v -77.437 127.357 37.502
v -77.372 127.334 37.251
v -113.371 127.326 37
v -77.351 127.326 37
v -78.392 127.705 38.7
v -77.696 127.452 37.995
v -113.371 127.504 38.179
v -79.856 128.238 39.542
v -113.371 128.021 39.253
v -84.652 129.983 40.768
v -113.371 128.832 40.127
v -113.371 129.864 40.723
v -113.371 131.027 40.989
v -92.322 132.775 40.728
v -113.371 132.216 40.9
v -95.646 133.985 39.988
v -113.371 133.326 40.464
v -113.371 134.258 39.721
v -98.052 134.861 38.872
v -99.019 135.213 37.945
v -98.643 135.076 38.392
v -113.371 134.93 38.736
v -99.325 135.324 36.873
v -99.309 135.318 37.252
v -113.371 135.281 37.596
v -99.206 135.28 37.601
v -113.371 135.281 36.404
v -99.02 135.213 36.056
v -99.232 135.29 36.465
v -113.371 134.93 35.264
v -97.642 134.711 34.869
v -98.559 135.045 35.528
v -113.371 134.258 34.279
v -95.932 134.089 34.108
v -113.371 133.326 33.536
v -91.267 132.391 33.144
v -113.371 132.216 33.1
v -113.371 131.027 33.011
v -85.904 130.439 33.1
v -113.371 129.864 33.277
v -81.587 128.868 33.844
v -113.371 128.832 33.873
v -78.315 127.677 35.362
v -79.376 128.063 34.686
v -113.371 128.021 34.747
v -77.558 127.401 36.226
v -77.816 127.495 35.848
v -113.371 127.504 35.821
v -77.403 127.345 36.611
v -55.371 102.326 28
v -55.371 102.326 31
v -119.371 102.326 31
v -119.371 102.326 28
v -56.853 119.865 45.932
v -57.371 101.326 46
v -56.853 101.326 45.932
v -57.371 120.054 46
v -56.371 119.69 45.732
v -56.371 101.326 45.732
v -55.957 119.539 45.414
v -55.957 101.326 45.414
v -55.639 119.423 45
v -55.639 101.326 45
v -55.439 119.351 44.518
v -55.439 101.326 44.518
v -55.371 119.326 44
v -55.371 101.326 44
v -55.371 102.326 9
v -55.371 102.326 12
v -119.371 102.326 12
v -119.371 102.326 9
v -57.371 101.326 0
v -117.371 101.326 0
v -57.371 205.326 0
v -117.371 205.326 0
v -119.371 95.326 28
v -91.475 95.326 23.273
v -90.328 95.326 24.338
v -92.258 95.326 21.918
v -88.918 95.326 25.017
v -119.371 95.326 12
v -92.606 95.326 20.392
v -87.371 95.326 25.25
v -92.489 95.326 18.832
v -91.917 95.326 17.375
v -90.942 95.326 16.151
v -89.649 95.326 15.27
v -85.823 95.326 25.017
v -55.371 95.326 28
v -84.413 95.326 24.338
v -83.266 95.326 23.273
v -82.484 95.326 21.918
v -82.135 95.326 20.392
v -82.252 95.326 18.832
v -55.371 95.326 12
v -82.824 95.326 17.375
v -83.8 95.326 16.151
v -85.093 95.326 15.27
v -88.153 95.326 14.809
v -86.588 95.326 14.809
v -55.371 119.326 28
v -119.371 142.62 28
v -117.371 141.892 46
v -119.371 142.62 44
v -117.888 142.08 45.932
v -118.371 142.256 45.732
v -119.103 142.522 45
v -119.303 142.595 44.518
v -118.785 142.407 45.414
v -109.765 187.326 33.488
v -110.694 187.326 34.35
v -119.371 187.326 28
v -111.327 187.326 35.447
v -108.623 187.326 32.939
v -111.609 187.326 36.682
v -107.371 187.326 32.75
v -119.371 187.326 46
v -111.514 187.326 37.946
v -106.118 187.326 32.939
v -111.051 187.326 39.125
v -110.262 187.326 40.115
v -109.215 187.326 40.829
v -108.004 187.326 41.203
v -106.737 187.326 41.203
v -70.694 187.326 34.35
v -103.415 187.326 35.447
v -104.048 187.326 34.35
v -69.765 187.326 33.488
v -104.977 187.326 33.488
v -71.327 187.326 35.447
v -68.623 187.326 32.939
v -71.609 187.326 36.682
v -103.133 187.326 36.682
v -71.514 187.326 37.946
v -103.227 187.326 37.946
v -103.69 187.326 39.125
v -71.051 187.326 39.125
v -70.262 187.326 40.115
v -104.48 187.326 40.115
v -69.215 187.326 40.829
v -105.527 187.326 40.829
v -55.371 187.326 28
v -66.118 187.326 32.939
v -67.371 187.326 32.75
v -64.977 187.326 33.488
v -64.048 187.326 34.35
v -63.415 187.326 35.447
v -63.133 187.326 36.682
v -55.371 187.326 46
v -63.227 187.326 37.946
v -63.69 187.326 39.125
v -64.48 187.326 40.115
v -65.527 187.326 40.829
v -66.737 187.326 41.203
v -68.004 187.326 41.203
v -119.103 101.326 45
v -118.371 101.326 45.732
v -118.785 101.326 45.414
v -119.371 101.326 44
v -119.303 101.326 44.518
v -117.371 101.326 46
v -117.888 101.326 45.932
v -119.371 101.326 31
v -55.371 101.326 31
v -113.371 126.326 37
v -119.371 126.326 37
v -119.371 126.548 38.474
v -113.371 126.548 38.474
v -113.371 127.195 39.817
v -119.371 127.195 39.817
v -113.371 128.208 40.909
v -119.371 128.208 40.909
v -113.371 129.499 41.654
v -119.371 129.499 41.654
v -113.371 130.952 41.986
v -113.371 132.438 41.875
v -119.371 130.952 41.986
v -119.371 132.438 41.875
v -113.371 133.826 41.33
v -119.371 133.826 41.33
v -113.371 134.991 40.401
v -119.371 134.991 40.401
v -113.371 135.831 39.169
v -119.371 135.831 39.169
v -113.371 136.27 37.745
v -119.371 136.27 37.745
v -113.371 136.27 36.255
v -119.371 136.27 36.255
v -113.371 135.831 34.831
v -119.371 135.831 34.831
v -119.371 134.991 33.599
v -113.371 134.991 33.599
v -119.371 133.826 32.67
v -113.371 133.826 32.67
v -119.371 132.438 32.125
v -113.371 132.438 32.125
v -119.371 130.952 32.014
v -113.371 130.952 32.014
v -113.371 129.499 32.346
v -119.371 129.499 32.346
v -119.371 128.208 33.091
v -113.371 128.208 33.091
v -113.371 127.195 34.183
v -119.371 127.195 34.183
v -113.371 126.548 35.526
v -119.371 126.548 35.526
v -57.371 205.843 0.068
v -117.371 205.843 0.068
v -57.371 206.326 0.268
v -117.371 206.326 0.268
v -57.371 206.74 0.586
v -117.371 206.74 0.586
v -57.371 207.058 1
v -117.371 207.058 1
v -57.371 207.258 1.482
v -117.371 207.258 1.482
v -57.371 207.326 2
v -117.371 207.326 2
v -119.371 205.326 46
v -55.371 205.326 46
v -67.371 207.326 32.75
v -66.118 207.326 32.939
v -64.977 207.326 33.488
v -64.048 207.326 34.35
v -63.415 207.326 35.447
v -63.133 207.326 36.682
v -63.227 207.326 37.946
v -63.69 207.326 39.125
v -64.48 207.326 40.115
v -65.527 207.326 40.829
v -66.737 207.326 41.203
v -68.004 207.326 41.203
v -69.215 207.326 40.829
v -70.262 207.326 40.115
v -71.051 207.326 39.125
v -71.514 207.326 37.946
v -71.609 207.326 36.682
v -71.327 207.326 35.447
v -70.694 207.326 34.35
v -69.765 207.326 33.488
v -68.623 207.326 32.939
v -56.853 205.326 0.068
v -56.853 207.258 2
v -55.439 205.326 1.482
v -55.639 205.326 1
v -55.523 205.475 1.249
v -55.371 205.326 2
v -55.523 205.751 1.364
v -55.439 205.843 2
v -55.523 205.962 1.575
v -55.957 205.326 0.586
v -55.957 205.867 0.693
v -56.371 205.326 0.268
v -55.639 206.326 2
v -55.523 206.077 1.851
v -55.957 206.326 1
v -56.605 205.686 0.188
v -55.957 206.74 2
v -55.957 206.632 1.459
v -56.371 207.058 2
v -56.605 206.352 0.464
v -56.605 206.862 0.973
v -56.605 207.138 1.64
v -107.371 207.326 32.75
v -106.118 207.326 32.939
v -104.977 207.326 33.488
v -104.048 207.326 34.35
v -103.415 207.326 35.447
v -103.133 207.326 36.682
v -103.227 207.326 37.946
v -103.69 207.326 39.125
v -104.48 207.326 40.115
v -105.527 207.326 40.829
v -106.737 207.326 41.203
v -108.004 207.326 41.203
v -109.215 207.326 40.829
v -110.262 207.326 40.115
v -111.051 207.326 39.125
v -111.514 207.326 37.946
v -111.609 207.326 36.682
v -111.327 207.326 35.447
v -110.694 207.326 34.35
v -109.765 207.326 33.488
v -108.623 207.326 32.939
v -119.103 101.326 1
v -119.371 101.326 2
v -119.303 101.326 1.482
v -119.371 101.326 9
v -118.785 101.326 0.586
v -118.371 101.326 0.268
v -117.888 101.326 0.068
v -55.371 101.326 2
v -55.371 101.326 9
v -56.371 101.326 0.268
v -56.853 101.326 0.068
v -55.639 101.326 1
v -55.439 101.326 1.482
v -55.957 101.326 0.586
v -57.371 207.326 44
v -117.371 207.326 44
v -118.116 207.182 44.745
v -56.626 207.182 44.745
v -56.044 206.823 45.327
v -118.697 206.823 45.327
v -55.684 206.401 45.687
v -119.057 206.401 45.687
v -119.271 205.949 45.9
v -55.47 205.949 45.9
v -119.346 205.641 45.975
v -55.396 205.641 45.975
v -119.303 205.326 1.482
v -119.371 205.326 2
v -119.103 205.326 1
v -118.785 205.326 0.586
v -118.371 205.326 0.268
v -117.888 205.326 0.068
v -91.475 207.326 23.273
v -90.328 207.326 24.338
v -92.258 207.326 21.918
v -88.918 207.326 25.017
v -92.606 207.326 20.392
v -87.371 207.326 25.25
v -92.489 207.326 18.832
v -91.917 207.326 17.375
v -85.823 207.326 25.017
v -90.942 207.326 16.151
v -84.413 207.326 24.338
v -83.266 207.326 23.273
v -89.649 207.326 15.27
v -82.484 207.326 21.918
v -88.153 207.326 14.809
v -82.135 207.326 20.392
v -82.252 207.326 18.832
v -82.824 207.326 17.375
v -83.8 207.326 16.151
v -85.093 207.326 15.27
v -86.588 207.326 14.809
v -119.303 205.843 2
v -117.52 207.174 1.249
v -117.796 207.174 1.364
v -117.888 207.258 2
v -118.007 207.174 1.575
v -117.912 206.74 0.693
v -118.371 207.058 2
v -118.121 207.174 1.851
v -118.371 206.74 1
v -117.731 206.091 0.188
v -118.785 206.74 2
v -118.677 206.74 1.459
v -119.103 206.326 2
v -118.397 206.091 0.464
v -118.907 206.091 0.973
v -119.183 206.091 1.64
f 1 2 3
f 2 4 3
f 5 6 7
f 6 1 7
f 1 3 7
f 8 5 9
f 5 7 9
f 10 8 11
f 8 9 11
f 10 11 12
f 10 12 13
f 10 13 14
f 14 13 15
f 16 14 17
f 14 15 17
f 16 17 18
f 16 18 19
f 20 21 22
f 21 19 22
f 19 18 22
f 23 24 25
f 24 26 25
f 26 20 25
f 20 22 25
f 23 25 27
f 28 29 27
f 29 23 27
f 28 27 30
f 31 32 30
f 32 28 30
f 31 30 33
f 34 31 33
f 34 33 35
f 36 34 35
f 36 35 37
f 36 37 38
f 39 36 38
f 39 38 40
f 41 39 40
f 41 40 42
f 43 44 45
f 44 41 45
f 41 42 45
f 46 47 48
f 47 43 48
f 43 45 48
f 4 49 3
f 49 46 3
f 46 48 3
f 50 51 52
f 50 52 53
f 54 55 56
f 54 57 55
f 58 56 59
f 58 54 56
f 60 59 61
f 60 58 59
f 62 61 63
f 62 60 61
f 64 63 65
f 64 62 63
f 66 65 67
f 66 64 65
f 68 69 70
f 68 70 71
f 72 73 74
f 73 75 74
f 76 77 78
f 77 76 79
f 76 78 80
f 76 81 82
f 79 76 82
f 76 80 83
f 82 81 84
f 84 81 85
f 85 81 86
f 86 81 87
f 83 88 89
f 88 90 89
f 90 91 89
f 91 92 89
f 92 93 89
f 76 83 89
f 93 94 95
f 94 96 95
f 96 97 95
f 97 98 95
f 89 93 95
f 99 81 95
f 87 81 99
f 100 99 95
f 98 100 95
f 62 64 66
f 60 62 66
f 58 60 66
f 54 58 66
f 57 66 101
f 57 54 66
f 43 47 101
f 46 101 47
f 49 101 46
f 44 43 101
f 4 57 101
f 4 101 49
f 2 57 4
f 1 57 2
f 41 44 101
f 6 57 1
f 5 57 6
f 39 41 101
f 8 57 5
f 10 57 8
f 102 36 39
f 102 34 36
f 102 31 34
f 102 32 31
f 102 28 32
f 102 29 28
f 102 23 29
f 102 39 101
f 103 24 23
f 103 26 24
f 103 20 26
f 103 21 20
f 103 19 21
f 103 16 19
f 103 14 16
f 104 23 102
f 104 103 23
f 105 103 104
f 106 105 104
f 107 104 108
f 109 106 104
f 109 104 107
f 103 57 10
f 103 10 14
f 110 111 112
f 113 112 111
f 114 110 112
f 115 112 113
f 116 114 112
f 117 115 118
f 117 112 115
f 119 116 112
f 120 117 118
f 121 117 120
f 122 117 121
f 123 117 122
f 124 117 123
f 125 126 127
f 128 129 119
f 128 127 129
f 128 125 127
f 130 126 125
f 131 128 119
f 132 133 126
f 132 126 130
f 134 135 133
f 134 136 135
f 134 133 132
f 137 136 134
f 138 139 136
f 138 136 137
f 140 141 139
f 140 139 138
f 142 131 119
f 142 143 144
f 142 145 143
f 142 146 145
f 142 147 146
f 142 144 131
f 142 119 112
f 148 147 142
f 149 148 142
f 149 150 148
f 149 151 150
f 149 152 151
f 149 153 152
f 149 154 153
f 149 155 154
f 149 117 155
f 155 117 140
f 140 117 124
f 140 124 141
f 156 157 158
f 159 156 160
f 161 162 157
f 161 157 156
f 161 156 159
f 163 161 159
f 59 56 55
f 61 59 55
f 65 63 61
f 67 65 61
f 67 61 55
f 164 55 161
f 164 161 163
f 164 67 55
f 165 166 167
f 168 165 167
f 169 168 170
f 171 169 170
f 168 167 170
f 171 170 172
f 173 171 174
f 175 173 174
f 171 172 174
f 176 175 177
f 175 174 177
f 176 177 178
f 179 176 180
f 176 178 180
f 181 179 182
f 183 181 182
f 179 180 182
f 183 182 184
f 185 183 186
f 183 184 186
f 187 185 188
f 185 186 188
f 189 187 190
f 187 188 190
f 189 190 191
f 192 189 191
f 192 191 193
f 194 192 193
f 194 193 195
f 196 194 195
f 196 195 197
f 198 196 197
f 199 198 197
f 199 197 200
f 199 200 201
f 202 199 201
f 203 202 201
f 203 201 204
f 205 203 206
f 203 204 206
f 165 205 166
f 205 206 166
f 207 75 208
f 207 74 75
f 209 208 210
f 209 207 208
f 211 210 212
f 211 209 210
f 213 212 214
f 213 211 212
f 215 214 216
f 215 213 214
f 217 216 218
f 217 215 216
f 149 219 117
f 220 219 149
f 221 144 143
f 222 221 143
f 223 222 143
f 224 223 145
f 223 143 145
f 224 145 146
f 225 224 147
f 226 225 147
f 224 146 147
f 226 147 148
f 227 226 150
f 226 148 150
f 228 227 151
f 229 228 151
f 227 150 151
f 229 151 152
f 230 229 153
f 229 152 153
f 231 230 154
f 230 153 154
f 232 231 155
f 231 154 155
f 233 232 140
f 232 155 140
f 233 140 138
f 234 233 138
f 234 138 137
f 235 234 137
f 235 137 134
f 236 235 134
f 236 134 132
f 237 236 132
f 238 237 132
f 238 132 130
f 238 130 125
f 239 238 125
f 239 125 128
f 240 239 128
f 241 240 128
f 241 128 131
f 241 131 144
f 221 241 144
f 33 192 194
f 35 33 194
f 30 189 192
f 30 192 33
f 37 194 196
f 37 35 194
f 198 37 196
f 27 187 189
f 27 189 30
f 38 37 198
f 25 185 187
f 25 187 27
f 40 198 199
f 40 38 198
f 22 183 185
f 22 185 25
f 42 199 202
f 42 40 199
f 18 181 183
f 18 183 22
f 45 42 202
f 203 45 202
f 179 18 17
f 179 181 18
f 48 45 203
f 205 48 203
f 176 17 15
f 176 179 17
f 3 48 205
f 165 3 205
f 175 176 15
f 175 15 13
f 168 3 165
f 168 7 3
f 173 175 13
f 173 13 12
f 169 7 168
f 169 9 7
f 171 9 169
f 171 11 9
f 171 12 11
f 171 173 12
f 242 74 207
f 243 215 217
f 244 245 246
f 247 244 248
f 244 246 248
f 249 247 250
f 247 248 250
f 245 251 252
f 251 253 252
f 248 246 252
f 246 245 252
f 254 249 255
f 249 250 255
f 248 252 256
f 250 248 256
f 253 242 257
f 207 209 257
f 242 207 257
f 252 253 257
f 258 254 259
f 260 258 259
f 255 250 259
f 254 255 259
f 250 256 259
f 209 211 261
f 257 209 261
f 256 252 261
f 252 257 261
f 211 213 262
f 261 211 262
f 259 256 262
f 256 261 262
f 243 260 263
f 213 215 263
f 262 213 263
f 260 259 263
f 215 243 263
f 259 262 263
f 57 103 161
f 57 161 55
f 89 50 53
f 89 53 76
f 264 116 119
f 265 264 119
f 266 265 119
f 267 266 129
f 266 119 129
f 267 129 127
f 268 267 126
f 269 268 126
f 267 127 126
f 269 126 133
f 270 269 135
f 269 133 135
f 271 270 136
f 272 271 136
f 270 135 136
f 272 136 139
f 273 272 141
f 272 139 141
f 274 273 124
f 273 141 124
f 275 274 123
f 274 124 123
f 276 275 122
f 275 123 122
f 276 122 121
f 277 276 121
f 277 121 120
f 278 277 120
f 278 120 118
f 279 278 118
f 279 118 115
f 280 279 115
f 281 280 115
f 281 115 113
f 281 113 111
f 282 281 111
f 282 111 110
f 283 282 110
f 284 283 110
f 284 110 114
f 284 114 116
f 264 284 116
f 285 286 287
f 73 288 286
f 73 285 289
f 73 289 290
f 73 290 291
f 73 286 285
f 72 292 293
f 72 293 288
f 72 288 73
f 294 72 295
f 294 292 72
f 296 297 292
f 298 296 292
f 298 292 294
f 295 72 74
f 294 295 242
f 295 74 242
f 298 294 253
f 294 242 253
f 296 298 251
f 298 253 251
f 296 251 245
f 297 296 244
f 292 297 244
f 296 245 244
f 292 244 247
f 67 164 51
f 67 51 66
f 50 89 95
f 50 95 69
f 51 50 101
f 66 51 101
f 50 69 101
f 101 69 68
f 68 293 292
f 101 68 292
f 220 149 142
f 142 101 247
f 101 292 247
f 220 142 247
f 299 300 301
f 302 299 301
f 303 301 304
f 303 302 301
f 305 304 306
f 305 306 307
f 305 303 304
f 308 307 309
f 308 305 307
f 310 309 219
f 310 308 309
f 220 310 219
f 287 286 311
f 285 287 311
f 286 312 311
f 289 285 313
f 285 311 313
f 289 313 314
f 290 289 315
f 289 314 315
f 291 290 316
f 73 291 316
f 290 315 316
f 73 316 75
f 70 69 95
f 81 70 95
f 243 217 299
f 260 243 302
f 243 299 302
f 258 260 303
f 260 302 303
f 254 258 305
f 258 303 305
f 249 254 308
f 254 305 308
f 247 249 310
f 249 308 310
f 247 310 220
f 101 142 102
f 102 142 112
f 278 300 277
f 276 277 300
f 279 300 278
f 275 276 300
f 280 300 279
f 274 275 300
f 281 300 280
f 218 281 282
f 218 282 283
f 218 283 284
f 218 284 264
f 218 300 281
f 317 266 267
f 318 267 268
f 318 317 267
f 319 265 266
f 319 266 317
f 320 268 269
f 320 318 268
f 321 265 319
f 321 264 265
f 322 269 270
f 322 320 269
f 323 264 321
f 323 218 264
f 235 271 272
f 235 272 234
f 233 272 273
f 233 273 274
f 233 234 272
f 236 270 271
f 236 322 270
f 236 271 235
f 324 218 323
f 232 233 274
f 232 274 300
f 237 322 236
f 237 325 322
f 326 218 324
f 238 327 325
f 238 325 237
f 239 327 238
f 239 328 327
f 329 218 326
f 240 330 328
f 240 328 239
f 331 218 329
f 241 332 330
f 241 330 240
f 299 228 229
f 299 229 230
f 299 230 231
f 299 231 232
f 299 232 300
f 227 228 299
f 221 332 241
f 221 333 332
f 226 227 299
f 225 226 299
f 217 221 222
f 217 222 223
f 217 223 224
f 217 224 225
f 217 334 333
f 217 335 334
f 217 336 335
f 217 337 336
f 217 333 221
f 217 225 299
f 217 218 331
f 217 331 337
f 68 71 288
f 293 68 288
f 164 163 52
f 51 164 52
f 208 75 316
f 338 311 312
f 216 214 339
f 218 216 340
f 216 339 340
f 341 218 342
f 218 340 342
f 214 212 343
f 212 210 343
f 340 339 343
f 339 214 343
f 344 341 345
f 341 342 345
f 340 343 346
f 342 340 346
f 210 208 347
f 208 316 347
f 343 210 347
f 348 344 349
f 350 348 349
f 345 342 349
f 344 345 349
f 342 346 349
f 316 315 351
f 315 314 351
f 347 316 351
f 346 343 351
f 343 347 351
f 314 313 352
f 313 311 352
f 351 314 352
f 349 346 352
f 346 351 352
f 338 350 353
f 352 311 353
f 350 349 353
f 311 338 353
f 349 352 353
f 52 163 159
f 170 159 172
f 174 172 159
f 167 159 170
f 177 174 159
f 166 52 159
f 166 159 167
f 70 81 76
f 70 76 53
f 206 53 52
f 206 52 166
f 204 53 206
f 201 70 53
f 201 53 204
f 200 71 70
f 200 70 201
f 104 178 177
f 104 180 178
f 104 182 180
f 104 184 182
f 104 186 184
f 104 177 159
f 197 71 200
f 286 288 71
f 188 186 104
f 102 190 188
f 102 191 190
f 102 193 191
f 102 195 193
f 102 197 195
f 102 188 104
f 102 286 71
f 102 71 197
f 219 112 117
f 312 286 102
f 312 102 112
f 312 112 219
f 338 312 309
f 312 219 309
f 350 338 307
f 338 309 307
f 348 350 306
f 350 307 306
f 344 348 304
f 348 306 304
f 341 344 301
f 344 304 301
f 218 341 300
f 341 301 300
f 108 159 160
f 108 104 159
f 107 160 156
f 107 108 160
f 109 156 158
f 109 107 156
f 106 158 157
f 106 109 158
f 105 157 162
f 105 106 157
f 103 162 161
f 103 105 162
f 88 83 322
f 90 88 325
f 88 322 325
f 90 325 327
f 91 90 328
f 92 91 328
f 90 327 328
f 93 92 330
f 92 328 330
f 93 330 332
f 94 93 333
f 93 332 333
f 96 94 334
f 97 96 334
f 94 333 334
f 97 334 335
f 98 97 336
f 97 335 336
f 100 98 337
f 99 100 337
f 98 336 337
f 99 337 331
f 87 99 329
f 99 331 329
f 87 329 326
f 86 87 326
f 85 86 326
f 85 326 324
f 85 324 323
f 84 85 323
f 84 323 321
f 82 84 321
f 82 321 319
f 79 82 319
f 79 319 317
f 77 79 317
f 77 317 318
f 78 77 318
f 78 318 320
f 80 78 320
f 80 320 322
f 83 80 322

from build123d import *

# Parameters (mm, degrees)
SKETCH4_W              = 64
SKETCH4_H              = 112
BOSS_EXTRUDE1_DEPTH    = 46
CUT_EXTRUDE1_DEPTH     = 18
CUT_EXTRUDE2_DEPTH     = 90
SKETCH7_R              = 5.25
CUT_EXTRUDE3_DEPTH     = 273
M10_TAPPED_HOLE2_D     = 8.5
M10_TAPPED_HOLE2_DEPTH = 50
M10_TAPPED_HOLE2_TIP   = 2.553657631
SKETCH10_R             = 5
CUT_EXTRUDE4_DEPTH     = 6
SKETCH12_R             = 4
CUT_EXTRUDE5_DEPTH     = 50
FILLET1_R              = 2


with BuildPart() as part:
    # Sketch4 → Boss-Extrude1 (new body)
    with BuildSketch(Plane.XY):
        with Locations((-87.370786517, 151.325842697)):
            Rectangle(SKETCH4_W, SKETCH4_H)
    extrude(amount=BOSS_EXTRUDE1_DEPTH)

    # Sketch5 → Cut-Extrude1 (cut)
    with BuildSketch(Plane.XY.offset(46)):
        Polygon((-119.370786517, 187.325842697), (-55.370786517, 187.325842697), (-55.370786517, 119.325842697), (-119.370786517, 142.61993769), align=None)
    extrude(amount=-CUT_EXTRUDE1_DEPTH, mode=Mode.SUBTRACT)

    # Sketch6 → Cut-Extrude2 (cut)
    with BuildSketch(Plane(origin=(-55.370786517, 0, 0), x_dir=(0, 0, -1), z_dir=(1, 0, 0))):
        Polygon((-46, 101.325842697), (-31, 101.325842697), (-31, 102.325842697), (-28, 102.325842697), (-28, 95.325842697), (-46, 95.325842697), align=None)
        Polygon((-12, 95.325842697), (-12, 101.565088044), (-12, 102.325842697), (-9, 102.325842697), (-9, 101.325842697), (0, 101.325842697), (0, 95.325842697), align=None)
    extrude(amount=-CUT_EXTRUDE2_DEPTH, mode=Mode.SUBTRACT)

    # Sketch7 → Cut-Extrude3 (cut)
    with BuildSketch(Plane(origin=(0, 207.325842697, 0), x_dir=(1, 0, 0), z_dir=(0, 1, 0))):
        with Locations(Location((-87.370786517, -20, 0), (0, 0, 270))):
            Circle(SKETCH7_R)
    extrude(amount=-CUT_EXTRUDE3_DEPTH, mode=Mode.SUBTRACT)

    # M10 Tapped Hole2
    with Locations(Plane(origin=(-107.370786517, 207.325842697, 37), x_dir=(0, 0, 1), z_dir=(0, 1, 0))):
        with Locations((0, 0), (0, 40)):
            Hole(M10_TAPPED_HOLE2_D / 2, depth=M10_TAPPED_HOLE2_DEPTH)
            with Locations((0, 0, -(M10_TAPPED_HOLE2_DEPTH + M10_TAPPED_HOLE2_TIP / 2))):  # 118° drill point
                Cone(0, M10_TAPPED_HOLE2_D / 2, M10_TAPPED_HOLE2_TIP, mode=Mode.SUBTRACT)

    # Sketch10 → Cut-Extrude4 (cut)
    with BuildSketch(Plane.ZY.offset(119.370786517)):
        with Locations(Location((37, 131.325842697, 0), (0, 0, 270))):
            Circle(SKETCH10_R)
    extrude(amount=-CUT_EXTRUDE4_DEPTH, mode=Mode.SUBTRACT)

    # Sketch12 → Cut-Extrude5 (cut)
    with BuildSketch(Plane.ZY.offset(113.370786517)):
        with Locations(Location((37, 131.325842697, 0), (0, 0, 270))):
            Circle(SKETCH12_R)
    extrude(amount=-CUT_EXTRUDE5_DEPTH, mode=Mode.SUBTRACT)

    # Fillet1
    fillet1_edges = [part.edges().sort_by_distance(p)[0] for p in [
        (-55.370786517, 110.325842697, 46),
        (-119.370786517, 121.972890193, 46),
        (-119.370786517, 154.325842697, 0),
        (-87.370786517, 207.325842697, 0),
        (-55.370786517, 154.325842697, 0),
        (-55.370786517, 207.325842697, 23),
        (-87.370786517, 207.325842697, 46),
        (-119.370786517, 207.325842697, 23),
    ]]
    fillet(fillet1_edges, radius=FILLET1_R)


solid = part.part
